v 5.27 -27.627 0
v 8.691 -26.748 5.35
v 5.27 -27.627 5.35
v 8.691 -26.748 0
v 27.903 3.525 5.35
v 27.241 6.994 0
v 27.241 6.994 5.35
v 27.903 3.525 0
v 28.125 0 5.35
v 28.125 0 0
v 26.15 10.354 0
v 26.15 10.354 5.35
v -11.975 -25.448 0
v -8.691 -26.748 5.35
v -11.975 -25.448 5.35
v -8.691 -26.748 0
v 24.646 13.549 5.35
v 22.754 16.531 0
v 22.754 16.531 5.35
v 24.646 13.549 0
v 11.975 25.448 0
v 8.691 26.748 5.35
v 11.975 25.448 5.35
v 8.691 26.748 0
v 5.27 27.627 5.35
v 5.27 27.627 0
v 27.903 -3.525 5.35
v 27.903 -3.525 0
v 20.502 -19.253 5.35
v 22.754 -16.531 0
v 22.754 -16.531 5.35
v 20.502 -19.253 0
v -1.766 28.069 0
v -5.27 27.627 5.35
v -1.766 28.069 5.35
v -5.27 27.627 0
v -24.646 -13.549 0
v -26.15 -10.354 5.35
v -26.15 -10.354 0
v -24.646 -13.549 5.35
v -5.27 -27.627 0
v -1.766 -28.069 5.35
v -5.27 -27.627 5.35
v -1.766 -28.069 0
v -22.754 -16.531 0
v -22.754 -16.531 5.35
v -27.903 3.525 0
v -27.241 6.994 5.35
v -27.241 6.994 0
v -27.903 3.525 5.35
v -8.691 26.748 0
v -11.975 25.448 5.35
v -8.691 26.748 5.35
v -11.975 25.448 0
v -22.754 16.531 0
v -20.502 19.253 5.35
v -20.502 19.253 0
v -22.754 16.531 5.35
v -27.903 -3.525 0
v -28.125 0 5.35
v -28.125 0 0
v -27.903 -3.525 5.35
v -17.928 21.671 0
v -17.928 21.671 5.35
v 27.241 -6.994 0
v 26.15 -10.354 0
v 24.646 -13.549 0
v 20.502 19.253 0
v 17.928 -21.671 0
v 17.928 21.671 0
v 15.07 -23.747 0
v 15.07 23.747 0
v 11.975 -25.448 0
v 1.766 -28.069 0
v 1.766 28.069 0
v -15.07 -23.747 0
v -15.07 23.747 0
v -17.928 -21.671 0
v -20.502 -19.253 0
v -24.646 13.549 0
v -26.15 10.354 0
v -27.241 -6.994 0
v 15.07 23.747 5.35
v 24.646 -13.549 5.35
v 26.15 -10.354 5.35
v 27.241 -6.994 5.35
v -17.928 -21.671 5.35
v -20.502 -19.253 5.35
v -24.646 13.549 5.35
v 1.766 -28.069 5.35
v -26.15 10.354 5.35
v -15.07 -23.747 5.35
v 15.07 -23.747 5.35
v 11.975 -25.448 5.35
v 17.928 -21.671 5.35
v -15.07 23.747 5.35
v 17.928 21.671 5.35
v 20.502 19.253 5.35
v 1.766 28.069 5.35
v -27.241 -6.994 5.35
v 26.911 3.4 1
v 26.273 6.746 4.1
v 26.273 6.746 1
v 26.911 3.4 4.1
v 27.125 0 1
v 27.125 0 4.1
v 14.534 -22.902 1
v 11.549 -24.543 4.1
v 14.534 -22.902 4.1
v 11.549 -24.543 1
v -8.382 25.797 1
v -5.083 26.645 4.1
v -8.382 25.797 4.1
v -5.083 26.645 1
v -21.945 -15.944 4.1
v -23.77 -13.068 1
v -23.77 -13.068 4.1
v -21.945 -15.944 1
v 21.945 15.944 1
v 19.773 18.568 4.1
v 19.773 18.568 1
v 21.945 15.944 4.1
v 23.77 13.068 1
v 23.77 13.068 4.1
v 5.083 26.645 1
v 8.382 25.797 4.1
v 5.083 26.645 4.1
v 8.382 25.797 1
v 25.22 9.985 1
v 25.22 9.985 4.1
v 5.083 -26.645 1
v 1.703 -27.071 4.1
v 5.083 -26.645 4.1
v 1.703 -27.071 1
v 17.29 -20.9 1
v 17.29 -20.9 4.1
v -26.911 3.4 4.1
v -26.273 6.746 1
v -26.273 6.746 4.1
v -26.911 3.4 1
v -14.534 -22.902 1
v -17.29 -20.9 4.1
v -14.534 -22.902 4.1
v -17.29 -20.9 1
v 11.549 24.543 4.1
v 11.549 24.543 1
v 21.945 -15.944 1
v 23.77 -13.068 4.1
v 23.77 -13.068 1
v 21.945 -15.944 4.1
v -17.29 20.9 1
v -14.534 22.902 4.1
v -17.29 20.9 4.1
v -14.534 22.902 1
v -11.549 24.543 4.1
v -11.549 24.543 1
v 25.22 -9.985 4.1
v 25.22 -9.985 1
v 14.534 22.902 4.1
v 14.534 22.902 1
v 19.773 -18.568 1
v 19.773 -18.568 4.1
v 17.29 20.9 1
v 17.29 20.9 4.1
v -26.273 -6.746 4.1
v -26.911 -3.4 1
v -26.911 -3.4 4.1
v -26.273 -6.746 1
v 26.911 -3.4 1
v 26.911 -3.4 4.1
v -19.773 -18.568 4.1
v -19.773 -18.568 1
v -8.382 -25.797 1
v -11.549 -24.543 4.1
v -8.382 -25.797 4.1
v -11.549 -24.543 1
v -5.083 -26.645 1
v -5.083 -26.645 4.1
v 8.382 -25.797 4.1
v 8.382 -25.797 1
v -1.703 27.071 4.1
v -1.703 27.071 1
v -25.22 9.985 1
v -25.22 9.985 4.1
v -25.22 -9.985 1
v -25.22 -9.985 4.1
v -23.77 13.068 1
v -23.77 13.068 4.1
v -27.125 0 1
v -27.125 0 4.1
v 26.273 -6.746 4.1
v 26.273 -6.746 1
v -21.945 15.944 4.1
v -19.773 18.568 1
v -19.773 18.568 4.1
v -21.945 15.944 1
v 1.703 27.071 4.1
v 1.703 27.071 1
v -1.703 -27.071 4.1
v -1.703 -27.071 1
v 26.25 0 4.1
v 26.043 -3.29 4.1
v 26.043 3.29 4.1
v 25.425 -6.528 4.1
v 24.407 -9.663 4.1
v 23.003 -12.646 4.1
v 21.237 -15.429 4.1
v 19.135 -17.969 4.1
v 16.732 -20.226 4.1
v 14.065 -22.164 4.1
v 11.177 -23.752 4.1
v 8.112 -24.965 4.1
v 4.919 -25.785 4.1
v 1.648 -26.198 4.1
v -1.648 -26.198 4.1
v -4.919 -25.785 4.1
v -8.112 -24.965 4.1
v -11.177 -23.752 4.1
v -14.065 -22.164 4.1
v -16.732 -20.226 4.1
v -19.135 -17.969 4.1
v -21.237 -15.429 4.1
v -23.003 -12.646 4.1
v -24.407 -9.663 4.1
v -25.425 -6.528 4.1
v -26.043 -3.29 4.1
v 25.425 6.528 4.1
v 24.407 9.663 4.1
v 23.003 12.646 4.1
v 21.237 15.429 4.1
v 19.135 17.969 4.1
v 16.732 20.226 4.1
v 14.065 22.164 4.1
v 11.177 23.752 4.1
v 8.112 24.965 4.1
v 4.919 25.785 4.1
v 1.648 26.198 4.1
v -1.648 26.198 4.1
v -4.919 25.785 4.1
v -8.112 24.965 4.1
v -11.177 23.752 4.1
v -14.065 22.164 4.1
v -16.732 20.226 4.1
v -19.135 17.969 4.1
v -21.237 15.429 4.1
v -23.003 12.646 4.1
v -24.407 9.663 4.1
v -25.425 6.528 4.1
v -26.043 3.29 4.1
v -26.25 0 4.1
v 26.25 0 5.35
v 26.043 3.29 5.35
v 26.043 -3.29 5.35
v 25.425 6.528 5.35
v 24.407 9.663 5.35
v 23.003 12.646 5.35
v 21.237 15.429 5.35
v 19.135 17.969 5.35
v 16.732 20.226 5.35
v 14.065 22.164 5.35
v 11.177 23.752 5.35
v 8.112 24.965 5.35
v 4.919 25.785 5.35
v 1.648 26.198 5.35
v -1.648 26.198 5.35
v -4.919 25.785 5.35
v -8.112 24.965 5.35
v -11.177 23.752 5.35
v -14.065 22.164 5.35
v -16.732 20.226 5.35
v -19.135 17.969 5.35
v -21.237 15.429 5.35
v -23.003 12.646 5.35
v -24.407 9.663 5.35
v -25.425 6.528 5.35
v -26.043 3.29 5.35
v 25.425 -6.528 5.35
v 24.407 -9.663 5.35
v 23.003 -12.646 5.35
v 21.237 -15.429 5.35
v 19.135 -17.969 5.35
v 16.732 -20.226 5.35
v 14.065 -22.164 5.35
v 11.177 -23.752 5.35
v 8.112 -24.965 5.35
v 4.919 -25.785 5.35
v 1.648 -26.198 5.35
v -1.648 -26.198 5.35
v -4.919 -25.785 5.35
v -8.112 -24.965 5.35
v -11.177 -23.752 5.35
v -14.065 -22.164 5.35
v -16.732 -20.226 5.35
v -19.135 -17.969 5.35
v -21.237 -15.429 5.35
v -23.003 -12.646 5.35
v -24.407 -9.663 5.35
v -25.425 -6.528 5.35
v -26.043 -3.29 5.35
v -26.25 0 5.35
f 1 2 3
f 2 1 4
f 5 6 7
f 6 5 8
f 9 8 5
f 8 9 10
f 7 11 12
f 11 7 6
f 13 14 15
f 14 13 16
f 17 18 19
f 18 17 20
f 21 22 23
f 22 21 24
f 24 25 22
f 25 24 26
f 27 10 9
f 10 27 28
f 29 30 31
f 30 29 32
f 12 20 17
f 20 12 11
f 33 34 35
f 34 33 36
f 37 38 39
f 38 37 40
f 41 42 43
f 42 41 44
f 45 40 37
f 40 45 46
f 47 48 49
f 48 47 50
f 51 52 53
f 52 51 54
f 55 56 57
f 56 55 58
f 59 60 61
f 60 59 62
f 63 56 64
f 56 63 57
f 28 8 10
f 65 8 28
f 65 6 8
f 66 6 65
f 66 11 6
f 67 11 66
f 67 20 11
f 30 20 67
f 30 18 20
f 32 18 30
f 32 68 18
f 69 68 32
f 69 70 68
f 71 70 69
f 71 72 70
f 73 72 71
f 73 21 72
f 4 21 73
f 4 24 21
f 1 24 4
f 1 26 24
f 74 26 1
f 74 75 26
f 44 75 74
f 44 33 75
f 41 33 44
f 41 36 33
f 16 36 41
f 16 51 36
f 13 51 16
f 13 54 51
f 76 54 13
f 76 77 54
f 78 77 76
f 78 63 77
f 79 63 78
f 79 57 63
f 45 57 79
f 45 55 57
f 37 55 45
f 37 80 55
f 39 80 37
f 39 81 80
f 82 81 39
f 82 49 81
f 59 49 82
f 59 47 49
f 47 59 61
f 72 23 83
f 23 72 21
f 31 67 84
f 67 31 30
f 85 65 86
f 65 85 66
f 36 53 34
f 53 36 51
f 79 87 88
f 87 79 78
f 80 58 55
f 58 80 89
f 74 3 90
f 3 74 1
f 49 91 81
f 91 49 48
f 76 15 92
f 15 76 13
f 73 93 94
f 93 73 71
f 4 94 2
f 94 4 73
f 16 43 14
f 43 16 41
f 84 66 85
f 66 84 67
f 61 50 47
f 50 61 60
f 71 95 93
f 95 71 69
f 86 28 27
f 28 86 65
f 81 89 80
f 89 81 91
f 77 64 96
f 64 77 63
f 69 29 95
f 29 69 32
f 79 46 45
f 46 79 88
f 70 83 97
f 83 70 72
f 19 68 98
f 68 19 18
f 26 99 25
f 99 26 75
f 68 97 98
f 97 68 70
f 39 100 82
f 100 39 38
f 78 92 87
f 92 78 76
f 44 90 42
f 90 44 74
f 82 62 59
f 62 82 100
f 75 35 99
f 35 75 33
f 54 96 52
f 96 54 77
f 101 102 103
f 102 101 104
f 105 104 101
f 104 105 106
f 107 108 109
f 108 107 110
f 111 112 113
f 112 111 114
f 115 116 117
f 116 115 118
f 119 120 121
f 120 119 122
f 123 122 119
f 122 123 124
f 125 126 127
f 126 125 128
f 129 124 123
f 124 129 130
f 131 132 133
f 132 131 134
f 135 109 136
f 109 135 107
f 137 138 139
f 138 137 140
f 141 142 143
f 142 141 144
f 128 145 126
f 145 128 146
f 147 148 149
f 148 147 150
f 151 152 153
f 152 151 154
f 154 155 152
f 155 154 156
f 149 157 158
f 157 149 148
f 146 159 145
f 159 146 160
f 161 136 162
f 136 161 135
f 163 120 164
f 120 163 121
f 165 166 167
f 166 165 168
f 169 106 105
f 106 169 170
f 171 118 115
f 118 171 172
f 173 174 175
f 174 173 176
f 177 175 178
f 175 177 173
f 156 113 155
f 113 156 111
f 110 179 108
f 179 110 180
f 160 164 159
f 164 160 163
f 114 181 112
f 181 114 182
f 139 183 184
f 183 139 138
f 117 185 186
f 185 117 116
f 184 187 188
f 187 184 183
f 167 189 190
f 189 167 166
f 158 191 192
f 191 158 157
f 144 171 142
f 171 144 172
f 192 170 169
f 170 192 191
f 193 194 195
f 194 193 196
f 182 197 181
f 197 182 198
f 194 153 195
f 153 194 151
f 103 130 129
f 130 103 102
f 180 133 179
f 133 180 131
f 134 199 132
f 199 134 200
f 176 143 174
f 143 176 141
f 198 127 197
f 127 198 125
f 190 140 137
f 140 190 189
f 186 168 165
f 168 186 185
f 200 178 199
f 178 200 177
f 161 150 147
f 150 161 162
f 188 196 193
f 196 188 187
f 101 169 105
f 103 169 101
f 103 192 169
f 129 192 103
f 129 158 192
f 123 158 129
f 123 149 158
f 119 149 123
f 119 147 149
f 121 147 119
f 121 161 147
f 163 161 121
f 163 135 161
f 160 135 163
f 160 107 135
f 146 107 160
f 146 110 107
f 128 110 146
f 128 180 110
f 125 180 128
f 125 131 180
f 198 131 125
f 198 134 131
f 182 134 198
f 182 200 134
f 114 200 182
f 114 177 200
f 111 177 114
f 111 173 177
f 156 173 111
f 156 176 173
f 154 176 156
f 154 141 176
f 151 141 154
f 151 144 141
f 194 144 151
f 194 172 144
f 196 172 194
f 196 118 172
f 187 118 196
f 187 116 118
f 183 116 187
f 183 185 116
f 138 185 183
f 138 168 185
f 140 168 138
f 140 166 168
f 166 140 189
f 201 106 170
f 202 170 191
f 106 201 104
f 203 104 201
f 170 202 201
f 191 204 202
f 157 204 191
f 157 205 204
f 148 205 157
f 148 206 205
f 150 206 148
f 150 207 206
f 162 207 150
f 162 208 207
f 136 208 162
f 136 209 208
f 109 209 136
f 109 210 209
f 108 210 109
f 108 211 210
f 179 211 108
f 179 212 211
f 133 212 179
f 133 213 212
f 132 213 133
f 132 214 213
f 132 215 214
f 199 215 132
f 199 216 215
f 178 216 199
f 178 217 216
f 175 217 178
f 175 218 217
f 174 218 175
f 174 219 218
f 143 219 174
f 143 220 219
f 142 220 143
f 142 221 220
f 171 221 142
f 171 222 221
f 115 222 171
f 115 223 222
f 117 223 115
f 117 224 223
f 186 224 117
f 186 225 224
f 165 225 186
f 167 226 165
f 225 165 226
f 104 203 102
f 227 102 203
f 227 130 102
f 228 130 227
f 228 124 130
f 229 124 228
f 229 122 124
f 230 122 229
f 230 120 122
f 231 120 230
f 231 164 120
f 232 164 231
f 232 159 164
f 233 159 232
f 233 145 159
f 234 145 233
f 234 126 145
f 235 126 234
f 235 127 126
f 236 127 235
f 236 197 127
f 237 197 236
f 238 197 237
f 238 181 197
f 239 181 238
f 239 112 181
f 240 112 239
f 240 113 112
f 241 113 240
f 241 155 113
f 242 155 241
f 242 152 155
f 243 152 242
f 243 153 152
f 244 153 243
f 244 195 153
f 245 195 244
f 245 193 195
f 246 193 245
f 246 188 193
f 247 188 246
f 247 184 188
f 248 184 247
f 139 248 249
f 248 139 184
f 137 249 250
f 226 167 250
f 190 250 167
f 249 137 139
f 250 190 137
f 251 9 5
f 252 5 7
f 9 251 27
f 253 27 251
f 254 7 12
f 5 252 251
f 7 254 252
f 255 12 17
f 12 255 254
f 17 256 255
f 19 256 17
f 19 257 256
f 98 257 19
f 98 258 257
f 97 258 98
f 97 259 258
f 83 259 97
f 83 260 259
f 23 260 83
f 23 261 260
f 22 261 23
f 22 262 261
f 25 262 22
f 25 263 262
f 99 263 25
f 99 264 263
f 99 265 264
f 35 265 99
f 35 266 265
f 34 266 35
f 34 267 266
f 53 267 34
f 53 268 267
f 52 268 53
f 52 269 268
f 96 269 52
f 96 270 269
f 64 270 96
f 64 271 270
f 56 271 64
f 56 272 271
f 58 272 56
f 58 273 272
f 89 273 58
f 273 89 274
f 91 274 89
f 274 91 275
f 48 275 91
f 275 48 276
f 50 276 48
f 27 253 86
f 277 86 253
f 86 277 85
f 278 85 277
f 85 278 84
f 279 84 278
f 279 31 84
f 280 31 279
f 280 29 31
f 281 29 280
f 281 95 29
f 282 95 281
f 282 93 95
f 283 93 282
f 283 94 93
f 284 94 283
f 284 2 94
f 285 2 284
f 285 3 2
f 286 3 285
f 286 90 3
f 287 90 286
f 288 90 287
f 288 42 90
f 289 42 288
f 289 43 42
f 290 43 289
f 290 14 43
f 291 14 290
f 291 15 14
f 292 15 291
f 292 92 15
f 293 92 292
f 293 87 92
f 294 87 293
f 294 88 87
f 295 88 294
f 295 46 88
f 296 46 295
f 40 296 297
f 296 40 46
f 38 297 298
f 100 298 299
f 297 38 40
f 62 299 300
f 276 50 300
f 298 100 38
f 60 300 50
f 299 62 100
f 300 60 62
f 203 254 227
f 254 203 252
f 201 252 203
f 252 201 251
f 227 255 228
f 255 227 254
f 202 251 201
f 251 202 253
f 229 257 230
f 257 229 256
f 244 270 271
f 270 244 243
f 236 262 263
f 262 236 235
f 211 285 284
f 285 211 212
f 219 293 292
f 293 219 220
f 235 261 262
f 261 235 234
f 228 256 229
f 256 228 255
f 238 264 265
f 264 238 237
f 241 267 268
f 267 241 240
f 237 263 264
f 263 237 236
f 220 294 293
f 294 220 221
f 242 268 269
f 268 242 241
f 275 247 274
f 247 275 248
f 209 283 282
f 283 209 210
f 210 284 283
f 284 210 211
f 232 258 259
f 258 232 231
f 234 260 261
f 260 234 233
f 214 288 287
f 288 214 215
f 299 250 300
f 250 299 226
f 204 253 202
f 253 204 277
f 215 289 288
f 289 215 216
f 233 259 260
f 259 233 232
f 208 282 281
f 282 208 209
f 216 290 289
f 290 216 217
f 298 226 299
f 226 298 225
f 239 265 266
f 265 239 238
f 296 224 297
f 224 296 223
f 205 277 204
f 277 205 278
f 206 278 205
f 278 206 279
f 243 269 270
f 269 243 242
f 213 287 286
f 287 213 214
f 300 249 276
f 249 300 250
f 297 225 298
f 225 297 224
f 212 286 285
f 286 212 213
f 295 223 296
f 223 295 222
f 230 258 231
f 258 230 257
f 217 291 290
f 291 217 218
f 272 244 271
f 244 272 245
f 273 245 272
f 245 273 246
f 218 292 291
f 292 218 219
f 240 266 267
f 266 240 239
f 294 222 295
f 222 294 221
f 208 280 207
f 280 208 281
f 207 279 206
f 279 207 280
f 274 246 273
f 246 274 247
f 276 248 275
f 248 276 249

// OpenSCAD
// http://www.thingiverse.com/thing:1513164
// Customisable Can Base


// extra size for a tight fit
extra_size = 1.5; 
 // general thickness
thickness = 1;
// Rim Height
rim_h = 3.10;
// Can Diameter
can_dia = 52.75;
// Groove Diameter
groove_dia = 51.0;
// Groove Height
groove_h = 1.25;

// smoothing
$fn = 50;
// padding for manifold (ignore)
pad = 0.001; 


module lowerbase() {
    o_dia = can_dia + thickness*2 + extra_size;
    o_h = rim_h + thickness + extra_size/2;
    i_dia = can_dia + extra_size;
    i_h = rim_h+thickness*2+pad+ extra_size/2;


    difference() {
        cylinder(d=o_dia, h=o_h);
        translate([0,0,thickness]) cylinder(d=i_dia, h=i_h);
    }
}

module upperbase() {
    o_dia = can_dia + thickness*2 + extra_size;
    o_h = groove_h;
    i_dia = groove_dia + extra_size;
    i_h = groove_h+pad*2;
    
    difference() {
        cylinder(d=o_dia, h=o_h);
        translate([0,0,-pad]) cylinder(d=i_dia, h=i_h);
    }
}

lowerbase();
translate([0,0,rim_h + thickness]) upperbase();
